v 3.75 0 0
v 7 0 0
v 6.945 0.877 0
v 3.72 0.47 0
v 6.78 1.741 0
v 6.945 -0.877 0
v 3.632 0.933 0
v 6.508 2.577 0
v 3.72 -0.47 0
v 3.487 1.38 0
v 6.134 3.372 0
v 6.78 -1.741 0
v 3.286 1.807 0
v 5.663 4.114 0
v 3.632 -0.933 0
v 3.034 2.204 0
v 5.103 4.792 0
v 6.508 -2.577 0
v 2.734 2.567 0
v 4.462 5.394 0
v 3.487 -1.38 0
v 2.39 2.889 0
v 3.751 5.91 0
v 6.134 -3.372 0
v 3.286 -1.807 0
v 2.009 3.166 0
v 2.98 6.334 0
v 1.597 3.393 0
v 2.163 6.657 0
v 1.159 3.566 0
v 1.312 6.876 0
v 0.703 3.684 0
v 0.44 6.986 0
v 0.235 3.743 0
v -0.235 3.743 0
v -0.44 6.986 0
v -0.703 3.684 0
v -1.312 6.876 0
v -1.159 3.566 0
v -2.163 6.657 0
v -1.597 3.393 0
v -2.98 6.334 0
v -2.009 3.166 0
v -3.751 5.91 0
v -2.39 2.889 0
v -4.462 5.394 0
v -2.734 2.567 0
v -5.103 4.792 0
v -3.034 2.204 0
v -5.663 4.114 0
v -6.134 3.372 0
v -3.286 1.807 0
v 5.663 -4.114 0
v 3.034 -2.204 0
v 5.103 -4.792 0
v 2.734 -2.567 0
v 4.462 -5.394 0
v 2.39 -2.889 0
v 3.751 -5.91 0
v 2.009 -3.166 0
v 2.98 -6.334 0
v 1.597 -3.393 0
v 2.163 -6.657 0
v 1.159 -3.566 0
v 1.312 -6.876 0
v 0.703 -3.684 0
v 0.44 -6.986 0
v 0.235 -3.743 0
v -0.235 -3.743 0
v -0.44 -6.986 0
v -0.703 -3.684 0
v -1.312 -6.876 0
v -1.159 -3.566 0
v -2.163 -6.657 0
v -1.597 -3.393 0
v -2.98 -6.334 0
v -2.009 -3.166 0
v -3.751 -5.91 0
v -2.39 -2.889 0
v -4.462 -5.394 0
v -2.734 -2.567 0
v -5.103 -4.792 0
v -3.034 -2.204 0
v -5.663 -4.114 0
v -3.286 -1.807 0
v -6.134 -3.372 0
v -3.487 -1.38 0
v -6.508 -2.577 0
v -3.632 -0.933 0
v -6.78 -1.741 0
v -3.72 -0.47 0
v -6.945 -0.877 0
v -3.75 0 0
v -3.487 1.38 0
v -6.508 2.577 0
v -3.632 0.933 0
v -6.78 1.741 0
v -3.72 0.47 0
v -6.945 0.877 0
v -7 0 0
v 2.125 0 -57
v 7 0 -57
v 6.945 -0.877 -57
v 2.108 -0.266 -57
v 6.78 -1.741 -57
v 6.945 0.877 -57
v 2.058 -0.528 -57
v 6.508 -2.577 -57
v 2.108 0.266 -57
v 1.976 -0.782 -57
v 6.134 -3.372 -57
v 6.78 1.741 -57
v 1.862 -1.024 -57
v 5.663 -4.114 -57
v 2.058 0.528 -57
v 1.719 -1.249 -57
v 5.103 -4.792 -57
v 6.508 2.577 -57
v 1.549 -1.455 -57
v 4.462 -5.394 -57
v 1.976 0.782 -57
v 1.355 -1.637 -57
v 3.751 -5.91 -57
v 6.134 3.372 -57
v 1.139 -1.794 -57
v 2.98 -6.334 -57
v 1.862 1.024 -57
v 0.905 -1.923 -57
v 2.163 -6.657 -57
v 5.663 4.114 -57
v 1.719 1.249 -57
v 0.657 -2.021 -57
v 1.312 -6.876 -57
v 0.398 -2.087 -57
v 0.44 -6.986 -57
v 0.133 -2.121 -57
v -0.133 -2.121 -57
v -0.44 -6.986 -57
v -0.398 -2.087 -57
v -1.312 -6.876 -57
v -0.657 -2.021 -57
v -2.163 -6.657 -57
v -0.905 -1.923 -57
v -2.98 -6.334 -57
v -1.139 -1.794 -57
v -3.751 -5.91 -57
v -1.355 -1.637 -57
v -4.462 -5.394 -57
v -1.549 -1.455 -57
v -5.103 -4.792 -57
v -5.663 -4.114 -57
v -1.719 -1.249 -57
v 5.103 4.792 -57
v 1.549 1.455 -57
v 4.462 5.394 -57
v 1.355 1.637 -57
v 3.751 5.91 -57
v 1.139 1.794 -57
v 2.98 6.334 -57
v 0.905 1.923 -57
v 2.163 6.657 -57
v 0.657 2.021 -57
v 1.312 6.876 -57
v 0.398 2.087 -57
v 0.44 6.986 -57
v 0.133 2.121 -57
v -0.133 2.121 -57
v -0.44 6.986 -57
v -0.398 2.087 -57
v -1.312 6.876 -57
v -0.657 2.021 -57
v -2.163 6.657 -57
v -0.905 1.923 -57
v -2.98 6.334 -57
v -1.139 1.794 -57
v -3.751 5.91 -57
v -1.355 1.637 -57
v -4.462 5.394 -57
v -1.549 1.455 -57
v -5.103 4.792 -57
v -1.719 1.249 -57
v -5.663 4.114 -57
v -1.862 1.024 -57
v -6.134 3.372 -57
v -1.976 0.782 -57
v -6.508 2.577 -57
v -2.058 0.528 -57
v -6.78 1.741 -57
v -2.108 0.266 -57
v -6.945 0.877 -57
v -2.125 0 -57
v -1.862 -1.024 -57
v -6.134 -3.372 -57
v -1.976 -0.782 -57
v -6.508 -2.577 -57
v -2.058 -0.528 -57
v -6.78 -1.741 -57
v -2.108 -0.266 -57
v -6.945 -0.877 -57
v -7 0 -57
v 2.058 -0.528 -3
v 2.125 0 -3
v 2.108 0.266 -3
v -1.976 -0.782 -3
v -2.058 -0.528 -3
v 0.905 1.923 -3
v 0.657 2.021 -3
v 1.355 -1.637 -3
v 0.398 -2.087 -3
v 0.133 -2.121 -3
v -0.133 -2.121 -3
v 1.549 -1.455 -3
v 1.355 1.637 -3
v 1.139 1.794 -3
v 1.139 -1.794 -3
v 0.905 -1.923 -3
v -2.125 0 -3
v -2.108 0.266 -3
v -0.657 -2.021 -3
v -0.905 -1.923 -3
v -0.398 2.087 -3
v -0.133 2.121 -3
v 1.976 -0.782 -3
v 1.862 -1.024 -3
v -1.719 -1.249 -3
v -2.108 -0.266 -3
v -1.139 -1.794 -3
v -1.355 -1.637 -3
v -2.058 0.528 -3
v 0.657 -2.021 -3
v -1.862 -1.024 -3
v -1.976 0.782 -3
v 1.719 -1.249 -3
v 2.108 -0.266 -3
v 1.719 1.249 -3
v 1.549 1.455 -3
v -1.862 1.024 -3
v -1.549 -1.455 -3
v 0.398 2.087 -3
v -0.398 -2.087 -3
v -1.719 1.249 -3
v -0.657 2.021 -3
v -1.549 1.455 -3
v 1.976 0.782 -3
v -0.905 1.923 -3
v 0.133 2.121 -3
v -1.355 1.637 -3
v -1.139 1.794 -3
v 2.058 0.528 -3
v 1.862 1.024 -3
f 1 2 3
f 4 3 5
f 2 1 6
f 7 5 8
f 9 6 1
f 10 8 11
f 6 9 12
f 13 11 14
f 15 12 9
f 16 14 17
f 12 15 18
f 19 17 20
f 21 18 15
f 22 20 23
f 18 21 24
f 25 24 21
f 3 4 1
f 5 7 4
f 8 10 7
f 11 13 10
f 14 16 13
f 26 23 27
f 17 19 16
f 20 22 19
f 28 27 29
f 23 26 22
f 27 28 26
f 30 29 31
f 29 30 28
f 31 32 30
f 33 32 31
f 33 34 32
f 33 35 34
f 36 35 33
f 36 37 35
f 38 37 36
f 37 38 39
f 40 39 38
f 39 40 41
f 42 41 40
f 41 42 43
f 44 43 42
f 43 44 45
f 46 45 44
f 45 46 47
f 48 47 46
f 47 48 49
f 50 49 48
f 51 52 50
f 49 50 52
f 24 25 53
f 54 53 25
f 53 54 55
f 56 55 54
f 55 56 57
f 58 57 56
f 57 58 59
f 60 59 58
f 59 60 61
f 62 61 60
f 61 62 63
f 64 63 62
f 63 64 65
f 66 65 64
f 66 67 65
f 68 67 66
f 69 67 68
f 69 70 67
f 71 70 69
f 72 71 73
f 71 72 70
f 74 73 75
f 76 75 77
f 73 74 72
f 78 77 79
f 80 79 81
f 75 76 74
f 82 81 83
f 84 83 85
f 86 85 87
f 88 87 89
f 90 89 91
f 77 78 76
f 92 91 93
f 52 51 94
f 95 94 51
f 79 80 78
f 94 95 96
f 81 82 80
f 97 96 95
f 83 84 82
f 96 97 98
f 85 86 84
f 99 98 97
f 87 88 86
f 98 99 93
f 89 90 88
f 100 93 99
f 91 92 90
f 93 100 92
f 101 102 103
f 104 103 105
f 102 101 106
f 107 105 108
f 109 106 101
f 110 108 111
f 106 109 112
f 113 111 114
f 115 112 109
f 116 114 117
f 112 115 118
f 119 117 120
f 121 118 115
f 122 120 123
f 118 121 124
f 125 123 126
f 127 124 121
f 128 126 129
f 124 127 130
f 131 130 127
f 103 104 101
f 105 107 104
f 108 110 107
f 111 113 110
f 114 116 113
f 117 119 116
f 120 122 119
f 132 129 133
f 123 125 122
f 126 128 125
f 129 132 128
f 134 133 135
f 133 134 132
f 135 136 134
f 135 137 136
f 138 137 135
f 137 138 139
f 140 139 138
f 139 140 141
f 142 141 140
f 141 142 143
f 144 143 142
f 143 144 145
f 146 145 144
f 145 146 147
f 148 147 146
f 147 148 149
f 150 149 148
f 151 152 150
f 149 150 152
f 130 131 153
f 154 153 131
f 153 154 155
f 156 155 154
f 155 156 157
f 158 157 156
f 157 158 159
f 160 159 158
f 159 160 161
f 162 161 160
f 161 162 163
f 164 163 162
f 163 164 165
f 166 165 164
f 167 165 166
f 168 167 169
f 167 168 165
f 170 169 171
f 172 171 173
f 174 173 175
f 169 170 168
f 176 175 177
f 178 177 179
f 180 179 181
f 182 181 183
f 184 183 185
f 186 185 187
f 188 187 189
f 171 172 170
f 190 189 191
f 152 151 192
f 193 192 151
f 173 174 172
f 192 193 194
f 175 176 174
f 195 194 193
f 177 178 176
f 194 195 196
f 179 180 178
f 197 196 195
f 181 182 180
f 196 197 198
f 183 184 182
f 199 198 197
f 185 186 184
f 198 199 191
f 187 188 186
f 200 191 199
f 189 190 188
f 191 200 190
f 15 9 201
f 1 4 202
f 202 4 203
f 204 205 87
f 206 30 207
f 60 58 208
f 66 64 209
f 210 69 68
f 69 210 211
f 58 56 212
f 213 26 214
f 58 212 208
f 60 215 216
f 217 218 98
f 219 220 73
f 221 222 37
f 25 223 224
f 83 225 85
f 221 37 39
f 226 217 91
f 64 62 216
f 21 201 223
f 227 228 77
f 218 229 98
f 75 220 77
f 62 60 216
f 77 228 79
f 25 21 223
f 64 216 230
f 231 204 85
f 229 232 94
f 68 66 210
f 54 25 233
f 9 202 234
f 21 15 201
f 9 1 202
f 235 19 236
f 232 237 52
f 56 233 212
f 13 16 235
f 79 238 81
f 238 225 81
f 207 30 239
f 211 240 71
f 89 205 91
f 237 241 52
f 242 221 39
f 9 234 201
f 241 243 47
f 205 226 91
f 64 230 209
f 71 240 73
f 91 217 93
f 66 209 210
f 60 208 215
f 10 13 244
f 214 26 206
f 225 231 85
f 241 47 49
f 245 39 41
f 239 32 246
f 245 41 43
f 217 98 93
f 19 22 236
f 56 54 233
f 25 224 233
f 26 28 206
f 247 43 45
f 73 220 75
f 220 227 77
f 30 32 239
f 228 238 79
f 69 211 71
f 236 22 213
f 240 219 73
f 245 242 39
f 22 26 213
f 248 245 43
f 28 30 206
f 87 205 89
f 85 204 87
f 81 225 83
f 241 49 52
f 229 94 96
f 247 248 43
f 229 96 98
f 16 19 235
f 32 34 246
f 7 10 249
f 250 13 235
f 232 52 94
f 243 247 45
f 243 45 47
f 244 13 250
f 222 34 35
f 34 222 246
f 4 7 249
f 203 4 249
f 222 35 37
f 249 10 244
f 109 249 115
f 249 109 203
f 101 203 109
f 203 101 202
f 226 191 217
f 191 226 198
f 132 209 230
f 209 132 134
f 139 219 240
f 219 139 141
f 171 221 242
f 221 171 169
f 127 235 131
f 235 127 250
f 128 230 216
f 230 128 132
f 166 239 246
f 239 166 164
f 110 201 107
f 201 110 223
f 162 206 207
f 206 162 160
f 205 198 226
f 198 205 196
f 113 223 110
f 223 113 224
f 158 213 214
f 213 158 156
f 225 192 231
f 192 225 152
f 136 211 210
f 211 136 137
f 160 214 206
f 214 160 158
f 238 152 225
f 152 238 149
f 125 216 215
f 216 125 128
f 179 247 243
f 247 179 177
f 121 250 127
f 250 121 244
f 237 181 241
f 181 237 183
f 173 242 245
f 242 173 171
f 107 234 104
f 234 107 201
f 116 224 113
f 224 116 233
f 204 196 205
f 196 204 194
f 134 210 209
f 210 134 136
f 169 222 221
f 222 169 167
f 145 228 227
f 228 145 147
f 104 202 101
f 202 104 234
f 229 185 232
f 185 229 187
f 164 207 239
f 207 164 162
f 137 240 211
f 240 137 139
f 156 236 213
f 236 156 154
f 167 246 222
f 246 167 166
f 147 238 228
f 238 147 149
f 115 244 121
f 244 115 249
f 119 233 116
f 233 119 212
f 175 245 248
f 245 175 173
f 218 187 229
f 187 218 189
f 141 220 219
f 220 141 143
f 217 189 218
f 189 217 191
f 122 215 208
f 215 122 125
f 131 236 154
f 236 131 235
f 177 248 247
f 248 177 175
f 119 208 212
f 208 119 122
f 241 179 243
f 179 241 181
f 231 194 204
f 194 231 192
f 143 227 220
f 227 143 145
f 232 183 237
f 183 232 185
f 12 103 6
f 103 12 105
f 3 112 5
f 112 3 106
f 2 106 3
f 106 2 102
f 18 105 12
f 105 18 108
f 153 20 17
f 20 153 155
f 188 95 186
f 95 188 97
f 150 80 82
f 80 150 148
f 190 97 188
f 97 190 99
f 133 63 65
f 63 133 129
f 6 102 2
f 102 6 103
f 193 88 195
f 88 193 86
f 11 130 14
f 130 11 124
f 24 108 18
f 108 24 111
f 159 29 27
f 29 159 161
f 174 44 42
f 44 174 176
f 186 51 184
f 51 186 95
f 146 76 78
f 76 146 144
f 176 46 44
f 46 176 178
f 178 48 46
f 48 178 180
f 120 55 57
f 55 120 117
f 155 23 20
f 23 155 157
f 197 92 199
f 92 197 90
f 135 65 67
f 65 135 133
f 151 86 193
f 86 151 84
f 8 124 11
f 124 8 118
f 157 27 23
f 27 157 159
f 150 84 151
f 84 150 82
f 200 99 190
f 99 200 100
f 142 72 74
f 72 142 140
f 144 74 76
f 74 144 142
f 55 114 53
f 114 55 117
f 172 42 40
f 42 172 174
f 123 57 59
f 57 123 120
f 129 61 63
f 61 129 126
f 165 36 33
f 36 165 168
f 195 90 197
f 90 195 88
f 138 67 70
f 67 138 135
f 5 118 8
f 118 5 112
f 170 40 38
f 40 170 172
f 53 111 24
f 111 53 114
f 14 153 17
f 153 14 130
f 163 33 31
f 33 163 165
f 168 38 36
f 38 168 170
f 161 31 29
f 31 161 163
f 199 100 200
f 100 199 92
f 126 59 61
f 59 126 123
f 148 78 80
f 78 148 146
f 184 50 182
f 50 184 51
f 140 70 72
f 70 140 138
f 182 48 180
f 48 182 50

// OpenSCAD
$fn = 50;


difference() {
	union() {
		translate(v = [0, 0, -57.0000000000]) {
			cylinder(h = 57, r = 7.0000000000);
		}
		cylinder(h = 0, r = 17.0000000000);
	}
	union() {
		translate(v = [0, 0, 0]) {
			rotate(a = [0, 0, 0]) {
				difference() {
					union() {
						#translate(v = [0, 0, -57.0000000000]) {
							cylinder(h = 57, r = 2.0000000000);
						}
						#translate(v = [0, 0, -3]) {
							cylinder(h = 3, r = 7.0000000000, r1 = 2.1250000000, r2 = 3.7500000000);
						}
						#translate(v = [0, 0, -57.0000000000]) {
							cylinder(h = 57, r = 2.1250000000);
						}
						#translate(v = [0, 0, -57.0000000000]) {
							cylinder(h = 57, r = 2.0000000000);
						}
					}
					union();
				}
			}
		}
	}
}
